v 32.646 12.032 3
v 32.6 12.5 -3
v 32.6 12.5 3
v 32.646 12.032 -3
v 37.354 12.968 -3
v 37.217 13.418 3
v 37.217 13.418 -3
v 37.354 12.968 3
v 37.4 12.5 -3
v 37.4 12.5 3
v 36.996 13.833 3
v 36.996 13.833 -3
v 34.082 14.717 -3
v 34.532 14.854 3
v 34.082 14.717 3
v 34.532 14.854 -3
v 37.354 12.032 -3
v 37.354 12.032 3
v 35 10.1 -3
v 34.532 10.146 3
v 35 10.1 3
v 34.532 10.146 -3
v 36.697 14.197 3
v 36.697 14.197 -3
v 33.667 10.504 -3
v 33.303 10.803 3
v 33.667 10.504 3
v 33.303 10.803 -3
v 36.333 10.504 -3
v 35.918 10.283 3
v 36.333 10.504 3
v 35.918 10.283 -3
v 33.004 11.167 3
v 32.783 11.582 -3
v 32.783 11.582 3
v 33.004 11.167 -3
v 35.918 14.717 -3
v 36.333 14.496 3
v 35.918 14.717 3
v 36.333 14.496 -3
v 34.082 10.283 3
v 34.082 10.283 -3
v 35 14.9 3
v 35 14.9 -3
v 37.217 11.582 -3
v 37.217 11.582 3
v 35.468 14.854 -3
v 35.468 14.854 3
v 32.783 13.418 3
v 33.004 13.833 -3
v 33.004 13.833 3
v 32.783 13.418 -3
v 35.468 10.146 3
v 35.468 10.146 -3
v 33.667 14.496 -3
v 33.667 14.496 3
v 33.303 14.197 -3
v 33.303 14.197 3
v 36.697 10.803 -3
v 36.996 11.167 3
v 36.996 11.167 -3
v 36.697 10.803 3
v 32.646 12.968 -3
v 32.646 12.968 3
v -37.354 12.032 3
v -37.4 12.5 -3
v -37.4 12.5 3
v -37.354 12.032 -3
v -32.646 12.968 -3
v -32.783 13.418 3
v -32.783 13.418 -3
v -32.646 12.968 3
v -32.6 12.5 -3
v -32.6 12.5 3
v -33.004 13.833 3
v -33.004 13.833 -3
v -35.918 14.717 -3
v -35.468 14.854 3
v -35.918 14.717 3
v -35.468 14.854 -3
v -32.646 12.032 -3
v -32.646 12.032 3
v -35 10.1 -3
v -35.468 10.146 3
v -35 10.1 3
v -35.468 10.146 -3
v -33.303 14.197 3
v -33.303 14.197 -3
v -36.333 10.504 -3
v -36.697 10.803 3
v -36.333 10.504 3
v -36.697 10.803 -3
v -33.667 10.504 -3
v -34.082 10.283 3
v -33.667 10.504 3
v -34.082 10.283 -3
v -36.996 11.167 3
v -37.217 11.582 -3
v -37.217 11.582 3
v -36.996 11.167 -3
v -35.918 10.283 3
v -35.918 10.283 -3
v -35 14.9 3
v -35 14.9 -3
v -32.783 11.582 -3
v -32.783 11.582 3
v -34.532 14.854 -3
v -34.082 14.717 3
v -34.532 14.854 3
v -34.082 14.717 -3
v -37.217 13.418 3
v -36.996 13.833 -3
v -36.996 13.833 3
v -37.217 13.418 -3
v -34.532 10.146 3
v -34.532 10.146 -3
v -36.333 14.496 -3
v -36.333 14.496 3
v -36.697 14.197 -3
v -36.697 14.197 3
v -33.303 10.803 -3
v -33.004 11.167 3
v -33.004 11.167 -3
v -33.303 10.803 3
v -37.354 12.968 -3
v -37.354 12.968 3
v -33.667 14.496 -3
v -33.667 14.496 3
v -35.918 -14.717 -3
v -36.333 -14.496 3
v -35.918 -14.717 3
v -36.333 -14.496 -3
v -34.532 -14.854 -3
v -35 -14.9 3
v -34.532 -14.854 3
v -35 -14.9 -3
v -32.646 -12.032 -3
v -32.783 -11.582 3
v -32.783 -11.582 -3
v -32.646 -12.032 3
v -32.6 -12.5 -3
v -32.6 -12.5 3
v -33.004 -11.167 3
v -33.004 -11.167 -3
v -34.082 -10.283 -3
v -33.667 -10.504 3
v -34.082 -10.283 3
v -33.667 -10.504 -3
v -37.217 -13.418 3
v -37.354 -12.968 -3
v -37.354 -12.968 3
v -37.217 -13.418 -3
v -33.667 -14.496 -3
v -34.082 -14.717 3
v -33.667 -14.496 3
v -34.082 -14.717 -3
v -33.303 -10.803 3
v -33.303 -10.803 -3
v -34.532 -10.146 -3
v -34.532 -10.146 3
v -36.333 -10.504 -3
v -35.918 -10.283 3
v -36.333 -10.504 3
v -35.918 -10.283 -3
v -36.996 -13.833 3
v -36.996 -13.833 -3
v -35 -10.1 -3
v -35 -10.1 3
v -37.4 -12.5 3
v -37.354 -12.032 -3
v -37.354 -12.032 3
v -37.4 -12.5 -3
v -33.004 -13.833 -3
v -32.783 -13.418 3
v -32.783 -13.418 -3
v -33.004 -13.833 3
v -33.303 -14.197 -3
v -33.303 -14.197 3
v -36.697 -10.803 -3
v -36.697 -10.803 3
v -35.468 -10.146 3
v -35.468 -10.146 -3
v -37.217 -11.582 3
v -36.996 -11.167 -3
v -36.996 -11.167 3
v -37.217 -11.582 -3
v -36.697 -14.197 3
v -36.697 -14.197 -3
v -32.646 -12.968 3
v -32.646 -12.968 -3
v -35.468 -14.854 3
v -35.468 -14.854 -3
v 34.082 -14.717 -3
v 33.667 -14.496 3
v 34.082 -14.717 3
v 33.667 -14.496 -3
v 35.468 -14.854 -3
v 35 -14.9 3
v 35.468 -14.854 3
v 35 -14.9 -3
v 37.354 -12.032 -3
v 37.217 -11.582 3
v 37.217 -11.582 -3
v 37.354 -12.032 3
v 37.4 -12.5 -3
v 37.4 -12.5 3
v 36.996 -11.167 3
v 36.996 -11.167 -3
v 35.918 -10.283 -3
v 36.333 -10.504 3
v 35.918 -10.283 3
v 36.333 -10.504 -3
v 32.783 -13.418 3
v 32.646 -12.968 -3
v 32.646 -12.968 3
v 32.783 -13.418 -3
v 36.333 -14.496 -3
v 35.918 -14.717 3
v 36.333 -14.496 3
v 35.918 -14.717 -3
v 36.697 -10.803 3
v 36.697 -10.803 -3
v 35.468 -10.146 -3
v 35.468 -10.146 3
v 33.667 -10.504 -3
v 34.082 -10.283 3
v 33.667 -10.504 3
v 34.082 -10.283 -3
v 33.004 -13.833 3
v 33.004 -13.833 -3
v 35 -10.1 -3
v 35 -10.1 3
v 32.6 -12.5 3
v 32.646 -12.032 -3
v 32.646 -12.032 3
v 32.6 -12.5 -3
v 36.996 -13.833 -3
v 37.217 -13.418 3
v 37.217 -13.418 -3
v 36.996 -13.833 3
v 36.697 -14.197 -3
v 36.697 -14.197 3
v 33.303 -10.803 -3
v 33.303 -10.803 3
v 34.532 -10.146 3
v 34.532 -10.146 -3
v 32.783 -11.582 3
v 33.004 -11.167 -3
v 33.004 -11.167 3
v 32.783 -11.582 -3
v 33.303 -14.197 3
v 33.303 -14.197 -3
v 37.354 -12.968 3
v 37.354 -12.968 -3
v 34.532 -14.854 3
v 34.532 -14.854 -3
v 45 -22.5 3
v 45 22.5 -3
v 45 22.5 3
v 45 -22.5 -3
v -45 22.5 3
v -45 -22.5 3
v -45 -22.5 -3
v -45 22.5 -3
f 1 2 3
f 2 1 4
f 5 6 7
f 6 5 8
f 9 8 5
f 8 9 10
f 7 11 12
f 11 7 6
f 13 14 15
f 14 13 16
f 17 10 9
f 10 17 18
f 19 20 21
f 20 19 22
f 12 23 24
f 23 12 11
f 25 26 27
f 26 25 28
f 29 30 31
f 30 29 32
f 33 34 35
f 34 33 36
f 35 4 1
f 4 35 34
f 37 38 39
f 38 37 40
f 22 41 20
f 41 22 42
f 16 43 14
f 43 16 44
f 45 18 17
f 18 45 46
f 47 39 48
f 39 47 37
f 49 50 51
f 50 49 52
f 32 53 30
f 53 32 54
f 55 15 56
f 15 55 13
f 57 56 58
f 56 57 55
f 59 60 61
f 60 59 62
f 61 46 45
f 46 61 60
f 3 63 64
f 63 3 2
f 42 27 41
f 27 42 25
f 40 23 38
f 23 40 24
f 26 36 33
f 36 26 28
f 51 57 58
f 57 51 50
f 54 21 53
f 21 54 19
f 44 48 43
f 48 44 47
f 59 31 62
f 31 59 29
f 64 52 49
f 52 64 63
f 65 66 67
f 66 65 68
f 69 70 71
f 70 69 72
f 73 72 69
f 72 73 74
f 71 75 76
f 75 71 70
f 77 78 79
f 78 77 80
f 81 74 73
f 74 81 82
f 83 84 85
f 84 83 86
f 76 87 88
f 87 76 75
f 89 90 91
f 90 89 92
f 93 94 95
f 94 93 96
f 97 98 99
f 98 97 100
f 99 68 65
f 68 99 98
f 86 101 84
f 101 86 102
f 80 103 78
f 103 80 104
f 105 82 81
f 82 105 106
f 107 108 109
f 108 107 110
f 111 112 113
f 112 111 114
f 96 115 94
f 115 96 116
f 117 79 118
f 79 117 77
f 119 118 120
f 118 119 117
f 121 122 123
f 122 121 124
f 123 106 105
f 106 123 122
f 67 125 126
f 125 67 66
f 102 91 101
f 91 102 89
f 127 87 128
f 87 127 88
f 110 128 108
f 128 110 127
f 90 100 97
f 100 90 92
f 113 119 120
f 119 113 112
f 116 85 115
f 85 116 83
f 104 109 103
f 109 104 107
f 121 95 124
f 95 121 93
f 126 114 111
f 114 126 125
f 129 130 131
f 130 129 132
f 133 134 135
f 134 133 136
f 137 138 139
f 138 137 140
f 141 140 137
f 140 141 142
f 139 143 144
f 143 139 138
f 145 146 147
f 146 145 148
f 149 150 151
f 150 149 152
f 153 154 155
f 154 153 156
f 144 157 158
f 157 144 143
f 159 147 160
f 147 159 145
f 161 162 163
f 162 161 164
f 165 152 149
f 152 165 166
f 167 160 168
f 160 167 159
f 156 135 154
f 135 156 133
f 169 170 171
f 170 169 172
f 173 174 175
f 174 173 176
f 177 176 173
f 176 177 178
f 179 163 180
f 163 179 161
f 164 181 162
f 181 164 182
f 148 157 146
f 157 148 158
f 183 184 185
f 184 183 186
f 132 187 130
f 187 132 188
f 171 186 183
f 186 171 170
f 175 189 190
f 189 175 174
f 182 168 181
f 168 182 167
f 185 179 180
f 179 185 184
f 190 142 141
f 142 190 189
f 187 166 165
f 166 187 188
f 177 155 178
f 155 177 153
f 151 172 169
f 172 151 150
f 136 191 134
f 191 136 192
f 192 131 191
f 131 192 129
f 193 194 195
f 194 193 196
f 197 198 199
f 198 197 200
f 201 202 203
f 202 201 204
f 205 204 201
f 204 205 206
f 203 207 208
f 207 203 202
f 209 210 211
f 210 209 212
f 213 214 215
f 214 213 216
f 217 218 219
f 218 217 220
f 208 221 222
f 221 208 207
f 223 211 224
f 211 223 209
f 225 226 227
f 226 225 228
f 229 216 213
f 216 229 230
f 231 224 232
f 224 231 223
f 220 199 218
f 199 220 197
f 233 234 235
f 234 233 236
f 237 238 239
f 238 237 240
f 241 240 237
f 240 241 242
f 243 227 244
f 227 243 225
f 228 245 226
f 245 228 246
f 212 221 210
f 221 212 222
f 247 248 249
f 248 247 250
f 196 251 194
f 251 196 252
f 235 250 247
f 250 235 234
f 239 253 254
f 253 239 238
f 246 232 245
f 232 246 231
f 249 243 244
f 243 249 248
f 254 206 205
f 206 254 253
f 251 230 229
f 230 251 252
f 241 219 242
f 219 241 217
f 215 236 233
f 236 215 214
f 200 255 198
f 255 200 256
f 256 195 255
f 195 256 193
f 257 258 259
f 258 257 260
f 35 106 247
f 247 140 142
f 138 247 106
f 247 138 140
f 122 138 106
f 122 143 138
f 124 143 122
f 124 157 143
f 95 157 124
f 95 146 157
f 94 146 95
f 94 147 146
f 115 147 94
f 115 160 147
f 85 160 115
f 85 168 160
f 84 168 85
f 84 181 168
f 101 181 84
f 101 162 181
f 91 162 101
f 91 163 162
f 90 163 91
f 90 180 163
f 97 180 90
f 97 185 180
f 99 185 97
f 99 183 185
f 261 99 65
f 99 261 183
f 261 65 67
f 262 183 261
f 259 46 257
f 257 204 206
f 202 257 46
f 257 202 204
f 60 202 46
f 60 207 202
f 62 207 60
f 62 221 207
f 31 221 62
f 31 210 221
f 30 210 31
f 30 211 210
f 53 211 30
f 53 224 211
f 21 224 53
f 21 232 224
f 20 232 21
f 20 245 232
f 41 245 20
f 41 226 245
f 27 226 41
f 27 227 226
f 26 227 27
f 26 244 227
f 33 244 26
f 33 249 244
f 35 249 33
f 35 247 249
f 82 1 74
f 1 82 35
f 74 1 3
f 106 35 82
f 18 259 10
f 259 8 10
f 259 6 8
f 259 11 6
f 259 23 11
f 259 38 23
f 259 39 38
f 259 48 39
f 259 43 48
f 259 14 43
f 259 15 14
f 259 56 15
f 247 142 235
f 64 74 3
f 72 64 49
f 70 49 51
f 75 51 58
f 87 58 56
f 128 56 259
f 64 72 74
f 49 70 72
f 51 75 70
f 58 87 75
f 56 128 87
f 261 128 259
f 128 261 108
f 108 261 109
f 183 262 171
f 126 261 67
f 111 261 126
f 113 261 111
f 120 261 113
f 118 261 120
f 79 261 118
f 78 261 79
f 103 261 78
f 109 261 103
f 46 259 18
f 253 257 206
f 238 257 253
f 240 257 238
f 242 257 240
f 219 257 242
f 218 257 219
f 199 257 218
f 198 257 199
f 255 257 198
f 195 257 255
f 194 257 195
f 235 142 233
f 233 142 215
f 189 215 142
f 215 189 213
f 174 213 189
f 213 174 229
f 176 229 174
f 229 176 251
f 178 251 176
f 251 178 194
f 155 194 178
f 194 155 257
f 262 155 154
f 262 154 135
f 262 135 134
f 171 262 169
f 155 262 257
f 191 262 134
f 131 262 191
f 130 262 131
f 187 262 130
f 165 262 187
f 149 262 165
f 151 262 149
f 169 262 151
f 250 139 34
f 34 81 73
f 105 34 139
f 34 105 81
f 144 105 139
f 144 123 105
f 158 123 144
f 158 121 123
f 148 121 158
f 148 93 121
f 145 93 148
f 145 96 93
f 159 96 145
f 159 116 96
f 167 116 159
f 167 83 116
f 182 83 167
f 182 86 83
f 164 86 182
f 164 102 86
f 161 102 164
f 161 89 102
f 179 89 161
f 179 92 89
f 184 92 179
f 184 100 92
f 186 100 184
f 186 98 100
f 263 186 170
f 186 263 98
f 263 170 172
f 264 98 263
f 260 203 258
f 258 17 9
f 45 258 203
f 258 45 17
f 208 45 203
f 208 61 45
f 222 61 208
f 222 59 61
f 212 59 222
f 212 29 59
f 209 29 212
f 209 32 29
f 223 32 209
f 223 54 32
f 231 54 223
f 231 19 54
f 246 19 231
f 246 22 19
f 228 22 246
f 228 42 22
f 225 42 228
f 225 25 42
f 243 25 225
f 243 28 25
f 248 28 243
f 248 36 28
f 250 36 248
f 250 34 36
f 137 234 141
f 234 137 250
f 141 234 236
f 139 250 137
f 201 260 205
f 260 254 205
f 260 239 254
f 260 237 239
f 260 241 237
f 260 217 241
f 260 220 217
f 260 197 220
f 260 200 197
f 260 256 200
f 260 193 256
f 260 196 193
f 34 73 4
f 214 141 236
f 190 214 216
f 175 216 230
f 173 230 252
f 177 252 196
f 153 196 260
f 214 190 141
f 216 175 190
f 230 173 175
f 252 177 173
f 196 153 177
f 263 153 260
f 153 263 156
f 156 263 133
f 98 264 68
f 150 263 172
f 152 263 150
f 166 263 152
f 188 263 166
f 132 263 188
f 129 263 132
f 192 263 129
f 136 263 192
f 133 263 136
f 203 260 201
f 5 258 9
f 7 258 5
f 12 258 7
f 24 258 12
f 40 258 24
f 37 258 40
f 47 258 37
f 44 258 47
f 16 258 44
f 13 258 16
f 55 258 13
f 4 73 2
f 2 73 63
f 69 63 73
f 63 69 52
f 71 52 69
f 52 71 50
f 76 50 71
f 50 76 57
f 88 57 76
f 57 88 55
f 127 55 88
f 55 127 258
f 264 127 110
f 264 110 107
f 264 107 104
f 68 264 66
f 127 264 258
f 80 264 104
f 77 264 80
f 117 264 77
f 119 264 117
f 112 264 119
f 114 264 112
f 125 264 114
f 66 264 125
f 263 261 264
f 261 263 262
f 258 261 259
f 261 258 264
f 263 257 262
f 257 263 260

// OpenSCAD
$fn = 32;

// ----------------------------------------------------------------------
// Corner plate 90 x 45 x 6
// 4 holes, centres taken from the edge offset
// ----------------------------------------------------------------------

// --- parameters (mm) ---
plate = [90, 45, 6];    // overall size (x, y, z)
holes = 4;              // number of holes the drawing asks for
bore_d = 4.5;           // nominal hole diameter from the drawing
print_allowance = 0.3;  // clearance added for printing
edge = 10;              // hole centre offset from the plate edge

// --- derived feature positions (mm) ---
hole_d = bore_d + print_allowance;  // = 4.8   hole diameter as printed
corner_x = plate[0] / 2 - edge;     // = 35   corner hole X
corner_y = plate[1] / 2 - edge;     // = 12.5   corner hole Y
feature_centers = [
  [corner_x, corner_y],
  [-corner_x, corner_y],
  [-corner_x, -corner_y],
  [corner_x, -corner_y]
];   // hole centres the loop below drills

// plate outline, every hole drilled through with the same cutters
difference() {
  cube(plate, center = true);
  for (centre = feature_centers)
    translate([centre[0], centre[1], 0])
      cylinder(d = hole_d, h = plate[2] + 2, center = true);
}
